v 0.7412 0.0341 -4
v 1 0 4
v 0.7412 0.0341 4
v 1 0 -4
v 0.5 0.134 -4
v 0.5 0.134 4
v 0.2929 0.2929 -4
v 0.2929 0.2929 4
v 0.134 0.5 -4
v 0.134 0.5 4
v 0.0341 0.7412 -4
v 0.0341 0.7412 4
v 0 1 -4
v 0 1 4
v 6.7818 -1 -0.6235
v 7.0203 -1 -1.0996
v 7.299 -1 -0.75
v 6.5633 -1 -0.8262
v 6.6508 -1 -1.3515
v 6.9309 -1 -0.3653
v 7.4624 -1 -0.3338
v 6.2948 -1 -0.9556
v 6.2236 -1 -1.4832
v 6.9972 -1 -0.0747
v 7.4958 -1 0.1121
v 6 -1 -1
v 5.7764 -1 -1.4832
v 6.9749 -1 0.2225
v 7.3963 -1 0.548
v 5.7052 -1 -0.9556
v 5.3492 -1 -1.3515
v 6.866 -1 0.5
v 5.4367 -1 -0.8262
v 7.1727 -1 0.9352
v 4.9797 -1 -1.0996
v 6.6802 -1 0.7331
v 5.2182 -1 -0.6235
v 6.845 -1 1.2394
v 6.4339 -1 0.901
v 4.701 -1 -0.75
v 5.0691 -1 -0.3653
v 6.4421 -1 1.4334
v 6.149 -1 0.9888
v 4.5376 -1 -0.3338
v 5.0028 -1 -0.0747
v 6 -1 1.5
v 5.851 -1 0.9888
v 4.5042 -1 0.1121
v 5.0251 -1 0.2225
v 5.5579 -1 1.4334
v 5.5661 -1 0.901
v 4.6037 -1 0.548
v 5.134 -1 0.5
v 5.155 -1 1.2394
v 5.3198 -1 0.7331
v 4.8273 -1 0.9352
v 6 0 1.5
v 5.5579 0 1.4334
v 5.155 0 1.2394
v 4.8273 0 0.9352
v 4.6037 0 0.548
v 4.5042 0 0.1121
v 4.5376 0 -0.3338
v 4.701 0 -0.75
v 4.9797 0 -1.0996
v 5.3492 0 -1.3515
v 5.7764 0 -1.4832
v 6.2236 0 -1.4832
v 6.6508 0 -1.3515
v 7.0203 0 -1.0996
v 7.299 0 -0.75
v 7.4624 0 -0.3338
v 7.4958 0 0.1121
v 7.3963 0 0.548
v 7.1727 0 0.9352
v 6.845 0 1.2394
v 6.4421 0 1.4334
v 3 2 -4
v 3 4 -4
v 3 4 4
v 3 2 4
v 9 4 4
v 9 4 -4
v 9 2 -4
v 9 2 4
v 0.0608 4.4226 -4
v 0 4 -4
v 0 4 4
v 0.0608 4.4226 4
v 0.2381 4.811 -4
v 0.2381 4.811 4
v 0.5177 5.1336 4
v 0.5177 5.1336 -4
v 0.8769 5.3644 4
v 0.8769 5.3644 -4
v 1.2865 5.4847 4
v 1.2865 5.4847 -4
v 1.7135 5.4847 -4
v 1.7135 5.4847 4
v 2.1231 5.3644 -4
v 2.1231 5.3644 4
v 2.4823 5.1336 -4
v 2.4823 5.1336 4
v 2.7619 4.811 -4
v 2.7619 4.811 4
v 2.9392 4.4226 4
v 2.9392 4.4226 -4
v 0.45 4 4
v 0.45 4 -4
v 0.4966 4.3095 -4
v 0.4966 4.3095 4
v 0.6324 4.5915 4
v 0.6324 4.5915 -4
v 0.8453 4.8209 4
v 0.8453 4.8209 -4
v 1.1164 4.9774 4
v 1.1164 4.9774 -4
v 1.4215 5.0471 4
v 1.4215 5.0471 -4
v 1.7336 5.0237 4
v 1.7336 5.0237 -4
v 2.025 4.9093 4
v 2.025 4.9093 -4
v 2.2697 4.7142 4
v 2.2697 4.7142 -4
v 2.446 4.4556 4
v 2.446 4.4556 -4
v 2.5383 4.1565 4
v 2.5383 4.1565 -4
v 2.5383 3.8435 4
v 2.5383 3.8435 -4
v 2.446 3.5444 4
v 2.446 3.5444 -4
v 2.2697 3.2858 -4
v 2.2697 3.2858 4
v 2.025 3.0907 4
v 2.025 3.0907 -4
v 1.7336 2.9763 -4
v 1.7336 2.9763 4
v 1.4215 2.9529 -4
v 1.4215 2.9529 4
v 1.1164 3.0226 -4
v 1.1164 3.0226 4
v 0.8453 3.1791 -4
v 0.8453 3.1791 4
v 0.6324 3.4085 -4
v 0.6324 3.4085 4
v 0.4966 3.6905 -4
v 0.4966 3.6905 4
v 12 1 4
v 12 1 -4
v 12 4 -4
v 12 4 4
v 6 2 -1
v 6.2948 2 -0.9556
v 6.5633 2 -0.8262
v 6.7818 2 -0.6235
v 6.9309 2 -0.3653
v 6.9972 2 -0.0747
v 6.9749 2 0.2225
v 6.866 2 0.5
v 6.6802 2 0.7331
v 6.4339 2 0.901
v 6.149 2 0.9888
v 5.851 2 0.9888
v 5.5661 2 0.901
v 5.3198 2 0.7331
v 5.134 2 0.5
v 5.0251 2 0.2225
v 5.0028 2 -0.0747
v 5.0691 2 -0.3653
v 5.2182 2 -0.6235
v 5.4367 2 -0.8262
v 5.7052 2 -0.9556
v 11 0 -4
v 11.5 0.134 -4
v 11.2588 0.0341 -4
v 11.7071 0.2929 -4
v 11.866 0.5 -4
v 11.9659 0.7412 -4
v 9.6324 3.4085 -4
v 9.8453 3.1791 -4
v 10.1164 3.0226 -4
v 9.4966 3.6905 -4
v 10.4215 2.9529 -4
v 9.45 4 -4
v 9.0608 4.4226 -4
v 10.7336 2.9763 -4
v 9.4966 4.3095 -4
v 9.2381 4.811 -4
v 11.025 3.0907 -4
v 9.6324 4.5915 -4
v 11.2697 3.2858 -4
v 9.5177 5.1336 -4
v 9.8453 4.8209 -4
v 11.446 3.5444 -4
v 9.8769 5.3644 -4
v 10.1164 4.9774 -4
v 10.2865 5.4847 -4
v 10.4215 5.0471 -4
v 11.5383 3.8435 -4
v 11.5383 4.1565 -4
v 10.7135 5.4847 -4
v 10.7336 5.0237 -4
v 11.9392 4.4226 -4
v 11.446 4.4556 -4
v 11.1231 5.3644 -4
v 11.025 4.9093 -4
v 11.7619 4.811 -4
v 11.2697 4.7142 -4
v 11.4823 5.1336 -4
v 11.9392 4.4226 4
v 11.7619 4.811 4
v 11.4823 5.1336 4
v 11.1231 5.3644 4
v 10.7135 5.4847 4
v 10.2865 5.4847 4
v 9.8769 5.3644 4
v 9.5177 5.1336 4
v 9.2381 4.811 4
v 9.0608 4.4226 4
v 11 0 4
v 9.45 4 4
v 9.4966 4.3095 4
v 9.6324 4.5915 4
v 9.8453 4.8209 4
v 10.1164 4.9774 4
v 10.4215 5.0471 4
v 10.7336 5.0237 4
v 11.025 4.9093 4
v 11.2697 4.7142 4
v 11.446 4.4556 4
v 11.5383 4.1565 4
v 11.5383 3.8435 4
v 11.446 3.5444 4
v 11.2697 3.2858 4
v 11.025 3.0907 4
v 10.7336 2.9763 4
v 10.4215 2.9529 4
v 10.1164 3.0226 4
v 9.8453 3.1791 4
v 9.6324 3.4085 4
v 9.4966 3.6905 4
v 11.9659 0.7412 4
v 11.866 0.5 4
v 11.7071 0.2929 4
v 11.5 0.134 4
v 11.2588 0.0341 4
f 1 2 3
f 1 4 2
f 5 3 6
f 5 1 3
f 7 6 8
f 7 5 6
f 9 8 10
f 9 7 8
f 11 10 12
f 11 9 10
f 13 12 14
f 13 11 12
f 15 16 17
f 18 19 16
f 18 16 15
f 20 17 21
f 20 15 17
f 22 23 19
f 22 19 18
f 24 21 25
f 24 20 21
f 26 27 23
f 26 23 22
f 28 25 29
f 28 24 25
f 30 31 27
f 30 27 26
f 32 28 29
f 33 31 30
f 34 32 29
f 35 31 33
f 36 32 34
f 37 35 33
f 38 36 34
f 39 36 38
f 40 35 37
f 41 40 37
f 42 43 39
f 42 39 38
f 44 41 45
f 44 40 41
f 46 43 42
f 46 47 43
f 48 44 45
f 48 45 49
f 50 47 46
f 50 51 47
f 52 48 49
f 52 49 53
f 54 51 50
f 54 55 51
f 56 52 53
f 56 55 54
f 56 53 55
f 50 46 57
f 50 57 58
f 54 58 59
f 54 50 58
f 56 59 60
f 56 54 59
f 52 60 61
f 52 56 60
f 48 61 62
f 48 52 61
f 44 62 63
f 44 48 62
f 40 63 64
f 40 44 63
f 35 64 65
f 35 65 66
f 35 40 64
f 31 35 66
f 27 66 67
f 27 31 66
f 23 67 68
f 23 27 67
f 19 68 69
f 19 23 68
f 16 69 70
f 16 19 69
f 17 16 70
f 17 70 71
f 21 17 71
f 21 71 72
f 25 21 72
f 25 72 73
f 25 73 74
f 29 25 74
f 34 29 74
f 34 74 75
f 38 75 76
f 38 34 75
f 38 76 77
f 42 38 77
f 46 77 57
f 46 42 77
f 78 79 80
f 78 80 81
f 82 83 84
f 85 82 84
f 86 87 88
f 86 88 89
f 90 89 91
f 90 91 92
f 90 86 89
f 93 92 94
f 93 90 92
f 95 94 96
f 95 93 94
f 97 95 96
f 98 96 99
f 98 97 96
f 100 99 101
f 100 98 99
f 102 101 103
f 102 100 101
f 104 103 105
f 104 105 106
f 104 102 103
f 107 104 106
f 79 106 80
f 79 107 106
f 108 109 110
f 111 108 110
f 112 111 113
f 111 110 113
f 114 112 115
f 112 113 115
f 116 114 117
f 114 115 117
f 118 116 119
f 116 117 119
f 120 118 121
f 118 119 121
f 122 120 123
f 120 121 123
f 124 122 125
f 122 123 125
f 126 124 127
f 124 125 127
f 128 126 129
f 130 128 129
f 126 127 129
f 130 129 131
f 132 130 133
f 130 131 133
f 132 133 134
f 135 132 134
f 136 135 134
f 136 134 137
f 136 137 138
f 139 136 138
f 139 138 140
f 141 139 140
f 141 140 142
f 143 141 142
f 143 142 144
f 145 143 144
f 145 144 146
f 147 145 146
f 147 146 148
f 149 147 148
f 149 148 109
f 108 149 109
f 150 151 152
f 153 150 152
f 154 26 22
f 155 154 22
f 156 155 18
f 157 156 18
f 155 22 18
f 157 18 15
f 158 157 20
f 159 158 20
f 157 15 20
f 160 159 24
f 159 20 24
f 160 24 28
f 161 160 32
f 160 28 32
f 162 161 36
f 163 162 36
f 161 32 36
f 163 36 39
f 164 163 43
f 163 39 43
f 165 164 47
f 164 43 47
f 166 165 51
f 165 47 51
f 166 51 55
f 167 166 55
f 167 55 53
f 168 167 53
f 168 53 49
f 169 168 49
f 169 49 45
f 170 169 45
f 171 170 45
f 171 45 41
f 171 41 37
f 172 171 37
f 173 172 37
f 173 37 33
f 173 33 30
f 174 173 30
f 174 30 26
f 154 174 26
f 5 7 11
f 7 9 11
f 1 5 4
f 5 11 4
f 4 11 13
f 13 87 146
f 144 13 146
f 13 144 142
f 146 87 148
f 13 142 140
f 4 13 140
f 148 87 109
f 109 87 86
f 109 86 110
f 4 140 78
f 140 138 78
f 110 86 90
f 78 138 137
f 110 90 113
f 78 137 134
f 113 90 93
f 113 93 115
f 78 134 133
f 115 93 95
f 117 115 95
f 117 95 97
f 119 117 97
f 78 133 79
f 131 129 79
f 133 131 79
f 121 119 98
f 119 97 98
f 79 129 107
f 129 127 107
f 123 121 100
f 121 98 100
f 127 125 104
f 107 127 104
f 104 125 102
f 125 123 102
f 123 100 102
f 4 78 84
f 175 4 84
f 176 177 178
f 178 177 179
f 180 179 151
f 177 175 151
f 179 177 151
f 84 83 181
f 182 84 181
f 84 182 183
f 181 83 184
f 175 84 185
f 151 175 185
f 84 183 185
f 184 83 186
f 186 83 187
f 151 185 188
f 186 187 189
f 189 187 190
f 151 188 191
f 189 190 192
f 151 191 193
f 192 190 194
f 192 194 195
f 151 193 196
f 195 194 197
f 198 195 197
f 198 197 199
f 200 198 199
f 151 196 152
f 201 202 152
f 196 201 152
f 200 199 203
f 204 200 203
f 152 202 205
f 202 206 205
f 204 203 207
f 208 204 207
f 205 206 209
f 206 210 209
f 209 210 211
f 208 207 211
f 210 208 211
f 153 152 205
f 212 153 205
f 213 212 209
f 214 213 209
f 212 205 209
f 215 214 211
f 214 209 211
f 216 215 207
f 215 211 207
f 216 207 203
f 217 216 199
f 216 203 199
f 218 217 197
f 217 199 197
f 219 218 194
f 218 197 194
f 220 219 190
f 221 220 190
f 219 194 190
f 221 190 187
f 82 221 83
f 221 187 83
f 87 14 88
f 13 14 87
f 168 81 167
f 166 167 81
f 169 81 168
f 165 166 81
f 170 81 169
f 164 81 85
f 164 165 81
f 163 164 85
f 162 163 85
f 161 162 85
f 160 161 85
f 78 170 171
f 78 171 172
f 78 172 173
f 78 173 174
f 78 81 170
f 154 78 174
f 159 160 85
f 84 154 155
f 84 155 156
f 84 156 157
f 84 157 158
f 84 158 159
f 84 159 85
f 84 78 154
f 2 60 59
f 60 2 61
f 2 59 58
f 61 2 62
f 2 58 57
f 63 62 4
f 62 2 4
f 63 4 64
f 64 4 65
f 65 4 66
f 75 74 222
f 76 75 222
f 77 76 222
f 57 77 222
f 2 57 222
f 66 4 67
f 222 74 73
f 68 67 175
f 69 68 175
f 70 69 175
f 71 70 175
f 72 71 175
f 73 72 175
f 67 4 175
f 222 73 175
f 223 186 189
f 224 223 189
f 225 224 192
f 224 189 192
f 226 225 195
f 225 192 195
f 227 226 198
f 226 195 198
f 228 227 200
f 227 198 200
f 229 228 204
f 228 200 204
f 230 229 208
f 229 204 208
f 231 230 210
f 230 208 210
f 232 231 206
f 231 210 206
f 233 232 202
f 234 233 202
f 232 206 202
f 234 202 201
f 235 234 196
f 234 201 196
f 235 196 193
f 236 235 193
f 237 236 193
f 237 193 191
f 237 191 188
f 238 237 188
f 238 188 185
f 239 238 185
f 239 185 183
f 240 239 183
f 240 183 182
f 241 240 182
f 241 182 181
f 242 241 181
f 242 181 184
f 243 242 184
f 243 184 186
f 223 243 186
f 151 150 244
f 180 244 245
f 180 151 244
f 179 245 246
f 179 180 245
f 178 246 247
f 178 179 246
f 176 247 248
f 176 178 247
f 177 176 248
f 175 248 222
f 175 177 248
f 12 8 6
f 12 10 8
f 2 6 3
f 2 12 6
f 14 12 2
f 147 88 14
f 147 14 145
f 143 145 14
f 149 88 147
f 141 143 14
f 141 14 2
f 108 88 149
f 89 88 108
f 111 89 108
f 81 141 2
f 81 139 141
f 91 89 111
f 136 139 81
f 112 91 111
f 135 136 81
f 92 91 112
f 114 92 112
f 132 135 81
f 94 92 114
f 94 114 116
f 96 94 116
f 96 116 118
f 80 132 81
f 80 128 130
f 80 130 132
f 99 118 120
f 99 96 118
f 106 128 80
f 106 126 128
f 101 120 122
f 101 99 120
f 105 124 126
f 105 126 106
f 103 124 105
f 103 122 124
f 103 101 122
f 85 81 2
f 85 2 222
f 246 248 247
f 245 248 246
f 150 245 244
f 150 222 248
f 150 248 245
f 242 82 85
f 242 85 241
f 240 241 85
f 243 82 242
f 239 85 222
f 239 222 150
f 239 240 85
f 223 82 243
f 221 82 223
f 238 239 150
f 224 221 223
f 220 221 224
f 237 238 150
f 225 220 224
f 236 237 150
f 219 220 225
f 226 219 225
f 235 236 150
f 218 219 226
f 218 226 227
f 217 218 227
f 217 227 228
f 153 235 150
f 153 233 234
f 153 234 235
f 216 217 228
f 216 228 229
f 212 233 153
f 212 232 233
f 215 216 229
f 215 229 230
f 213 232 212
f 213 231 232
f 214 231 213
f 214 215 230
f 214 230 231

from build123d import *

# Parameters (mm, degrees)
SKETCH_1_W          = 12
SKETCH_1_H          = 8
EXTRUDE_1_DEPTH     = 2
EXTRUDE_6_DEPTH     = 8
SKETCH_11_R         = 1.05
CUT_EXTRUDE_1_DEPTH = 16.43534904
FILLET_3_R          = 1
SKETCH_12_R         = 1
CUT_EXTRUDE_2_DEPTH = 2
EXTRUDE_START       = 1
SKETCH_13_R         = 1.5
SKETCH_13_R_2       = 1
EXTRUDE_7_DEPTH     = 1


with BuildPart() as part:
    # 草图1 → 凸台-拉伸1 (new body)
    with BuildSketch(Plane(origin=(0, 0, 0), x_dir=(1, 0, 0), z_dir=(0, 1, 0))):
        with Locations((6, 0)):
            Rectangle(SKETCH_1_W, SKETCH_1_H)
    extrude(amount=EXTRUDE_1_DEPTH)

    # 草图10 → 凸台-拉伸6 (add)
    with BuildSketch(Plane(origin=(0, 0, -4), x_dir=(-1, 0, 0), z_dir=(0, 0, -1))):
        with BuildLine():
            Line((-12, 2), (-12, 4))
            ThreePointArc((-12, 4), (-10.5, 5.5), (-9, 4))
            Line((-9, 4), (-9, 2))
            Line((-9, 2), (-12, 2))
        make_face()
        with BuildLine():
            Line((-3, 2), (0, 2))
            Line((0, 2), (0, 4))
            ThreePointArc((0, 4), (-1.5, 5.5), (-3, 4))
            Line((-3, 4), (-3, 2))
        make_face()
    extrude(amount=-EXTRUDE_6_DEPTH)

    # 草图11 → 切除-拉伸1 (cut, through all)
    with BuildSketch(Plane(origin=(0, 0, -4), x_dir=(-1, 0, 0), z_dir=(0, 0, -1))):
        with Locations((-1.5, 4)):
            Circle(SKETCH_11_R)
        with Locations((-10.5, 4)):
            Circle(SKETCH_11_R)
    extrude(amount=-CUT_EXTRUDE_1_DEPTH, mode=Mode.SUBTRACT)

    # 圆角3
    fillet_3_edges = [part.edges().sort_by_distance(p)[0] for p in [
        (12, 0, 0),
        (0, 0, 0),
    ]]
    fillet(fillet_3_edges, radius=FILLET_3_R)

    # 草图12 → 切除-拉伸2 (cut)
    with BuildSketch(Plane.XZ):
        with Locations(Location((6, 0, 0), (0, 0, 270))):
            Circle(SKETCH_12_R)
    extrude(amount=-CUT_EXTRUDE_2_DEPTH, mode=Mode.SUBTRACT)

    # 草图13 → 凸台-拉伸7 (add)
    with BuildSketch(Plane.XZ.offset(EXTRUDE_START)):
        with Locations(Location((6, 0, 0), (0, 0, 90))):
            Circle(SKETCH_13_R)
        with Locations(Location((6, 0, 0), (0, 0, 270))):
            Circle(SKETCH_13_R_2, mode=Mode.SUBTRACT)
    extrude(amount=-EXTRUDE_7_DEPTH)


solid = part.part
